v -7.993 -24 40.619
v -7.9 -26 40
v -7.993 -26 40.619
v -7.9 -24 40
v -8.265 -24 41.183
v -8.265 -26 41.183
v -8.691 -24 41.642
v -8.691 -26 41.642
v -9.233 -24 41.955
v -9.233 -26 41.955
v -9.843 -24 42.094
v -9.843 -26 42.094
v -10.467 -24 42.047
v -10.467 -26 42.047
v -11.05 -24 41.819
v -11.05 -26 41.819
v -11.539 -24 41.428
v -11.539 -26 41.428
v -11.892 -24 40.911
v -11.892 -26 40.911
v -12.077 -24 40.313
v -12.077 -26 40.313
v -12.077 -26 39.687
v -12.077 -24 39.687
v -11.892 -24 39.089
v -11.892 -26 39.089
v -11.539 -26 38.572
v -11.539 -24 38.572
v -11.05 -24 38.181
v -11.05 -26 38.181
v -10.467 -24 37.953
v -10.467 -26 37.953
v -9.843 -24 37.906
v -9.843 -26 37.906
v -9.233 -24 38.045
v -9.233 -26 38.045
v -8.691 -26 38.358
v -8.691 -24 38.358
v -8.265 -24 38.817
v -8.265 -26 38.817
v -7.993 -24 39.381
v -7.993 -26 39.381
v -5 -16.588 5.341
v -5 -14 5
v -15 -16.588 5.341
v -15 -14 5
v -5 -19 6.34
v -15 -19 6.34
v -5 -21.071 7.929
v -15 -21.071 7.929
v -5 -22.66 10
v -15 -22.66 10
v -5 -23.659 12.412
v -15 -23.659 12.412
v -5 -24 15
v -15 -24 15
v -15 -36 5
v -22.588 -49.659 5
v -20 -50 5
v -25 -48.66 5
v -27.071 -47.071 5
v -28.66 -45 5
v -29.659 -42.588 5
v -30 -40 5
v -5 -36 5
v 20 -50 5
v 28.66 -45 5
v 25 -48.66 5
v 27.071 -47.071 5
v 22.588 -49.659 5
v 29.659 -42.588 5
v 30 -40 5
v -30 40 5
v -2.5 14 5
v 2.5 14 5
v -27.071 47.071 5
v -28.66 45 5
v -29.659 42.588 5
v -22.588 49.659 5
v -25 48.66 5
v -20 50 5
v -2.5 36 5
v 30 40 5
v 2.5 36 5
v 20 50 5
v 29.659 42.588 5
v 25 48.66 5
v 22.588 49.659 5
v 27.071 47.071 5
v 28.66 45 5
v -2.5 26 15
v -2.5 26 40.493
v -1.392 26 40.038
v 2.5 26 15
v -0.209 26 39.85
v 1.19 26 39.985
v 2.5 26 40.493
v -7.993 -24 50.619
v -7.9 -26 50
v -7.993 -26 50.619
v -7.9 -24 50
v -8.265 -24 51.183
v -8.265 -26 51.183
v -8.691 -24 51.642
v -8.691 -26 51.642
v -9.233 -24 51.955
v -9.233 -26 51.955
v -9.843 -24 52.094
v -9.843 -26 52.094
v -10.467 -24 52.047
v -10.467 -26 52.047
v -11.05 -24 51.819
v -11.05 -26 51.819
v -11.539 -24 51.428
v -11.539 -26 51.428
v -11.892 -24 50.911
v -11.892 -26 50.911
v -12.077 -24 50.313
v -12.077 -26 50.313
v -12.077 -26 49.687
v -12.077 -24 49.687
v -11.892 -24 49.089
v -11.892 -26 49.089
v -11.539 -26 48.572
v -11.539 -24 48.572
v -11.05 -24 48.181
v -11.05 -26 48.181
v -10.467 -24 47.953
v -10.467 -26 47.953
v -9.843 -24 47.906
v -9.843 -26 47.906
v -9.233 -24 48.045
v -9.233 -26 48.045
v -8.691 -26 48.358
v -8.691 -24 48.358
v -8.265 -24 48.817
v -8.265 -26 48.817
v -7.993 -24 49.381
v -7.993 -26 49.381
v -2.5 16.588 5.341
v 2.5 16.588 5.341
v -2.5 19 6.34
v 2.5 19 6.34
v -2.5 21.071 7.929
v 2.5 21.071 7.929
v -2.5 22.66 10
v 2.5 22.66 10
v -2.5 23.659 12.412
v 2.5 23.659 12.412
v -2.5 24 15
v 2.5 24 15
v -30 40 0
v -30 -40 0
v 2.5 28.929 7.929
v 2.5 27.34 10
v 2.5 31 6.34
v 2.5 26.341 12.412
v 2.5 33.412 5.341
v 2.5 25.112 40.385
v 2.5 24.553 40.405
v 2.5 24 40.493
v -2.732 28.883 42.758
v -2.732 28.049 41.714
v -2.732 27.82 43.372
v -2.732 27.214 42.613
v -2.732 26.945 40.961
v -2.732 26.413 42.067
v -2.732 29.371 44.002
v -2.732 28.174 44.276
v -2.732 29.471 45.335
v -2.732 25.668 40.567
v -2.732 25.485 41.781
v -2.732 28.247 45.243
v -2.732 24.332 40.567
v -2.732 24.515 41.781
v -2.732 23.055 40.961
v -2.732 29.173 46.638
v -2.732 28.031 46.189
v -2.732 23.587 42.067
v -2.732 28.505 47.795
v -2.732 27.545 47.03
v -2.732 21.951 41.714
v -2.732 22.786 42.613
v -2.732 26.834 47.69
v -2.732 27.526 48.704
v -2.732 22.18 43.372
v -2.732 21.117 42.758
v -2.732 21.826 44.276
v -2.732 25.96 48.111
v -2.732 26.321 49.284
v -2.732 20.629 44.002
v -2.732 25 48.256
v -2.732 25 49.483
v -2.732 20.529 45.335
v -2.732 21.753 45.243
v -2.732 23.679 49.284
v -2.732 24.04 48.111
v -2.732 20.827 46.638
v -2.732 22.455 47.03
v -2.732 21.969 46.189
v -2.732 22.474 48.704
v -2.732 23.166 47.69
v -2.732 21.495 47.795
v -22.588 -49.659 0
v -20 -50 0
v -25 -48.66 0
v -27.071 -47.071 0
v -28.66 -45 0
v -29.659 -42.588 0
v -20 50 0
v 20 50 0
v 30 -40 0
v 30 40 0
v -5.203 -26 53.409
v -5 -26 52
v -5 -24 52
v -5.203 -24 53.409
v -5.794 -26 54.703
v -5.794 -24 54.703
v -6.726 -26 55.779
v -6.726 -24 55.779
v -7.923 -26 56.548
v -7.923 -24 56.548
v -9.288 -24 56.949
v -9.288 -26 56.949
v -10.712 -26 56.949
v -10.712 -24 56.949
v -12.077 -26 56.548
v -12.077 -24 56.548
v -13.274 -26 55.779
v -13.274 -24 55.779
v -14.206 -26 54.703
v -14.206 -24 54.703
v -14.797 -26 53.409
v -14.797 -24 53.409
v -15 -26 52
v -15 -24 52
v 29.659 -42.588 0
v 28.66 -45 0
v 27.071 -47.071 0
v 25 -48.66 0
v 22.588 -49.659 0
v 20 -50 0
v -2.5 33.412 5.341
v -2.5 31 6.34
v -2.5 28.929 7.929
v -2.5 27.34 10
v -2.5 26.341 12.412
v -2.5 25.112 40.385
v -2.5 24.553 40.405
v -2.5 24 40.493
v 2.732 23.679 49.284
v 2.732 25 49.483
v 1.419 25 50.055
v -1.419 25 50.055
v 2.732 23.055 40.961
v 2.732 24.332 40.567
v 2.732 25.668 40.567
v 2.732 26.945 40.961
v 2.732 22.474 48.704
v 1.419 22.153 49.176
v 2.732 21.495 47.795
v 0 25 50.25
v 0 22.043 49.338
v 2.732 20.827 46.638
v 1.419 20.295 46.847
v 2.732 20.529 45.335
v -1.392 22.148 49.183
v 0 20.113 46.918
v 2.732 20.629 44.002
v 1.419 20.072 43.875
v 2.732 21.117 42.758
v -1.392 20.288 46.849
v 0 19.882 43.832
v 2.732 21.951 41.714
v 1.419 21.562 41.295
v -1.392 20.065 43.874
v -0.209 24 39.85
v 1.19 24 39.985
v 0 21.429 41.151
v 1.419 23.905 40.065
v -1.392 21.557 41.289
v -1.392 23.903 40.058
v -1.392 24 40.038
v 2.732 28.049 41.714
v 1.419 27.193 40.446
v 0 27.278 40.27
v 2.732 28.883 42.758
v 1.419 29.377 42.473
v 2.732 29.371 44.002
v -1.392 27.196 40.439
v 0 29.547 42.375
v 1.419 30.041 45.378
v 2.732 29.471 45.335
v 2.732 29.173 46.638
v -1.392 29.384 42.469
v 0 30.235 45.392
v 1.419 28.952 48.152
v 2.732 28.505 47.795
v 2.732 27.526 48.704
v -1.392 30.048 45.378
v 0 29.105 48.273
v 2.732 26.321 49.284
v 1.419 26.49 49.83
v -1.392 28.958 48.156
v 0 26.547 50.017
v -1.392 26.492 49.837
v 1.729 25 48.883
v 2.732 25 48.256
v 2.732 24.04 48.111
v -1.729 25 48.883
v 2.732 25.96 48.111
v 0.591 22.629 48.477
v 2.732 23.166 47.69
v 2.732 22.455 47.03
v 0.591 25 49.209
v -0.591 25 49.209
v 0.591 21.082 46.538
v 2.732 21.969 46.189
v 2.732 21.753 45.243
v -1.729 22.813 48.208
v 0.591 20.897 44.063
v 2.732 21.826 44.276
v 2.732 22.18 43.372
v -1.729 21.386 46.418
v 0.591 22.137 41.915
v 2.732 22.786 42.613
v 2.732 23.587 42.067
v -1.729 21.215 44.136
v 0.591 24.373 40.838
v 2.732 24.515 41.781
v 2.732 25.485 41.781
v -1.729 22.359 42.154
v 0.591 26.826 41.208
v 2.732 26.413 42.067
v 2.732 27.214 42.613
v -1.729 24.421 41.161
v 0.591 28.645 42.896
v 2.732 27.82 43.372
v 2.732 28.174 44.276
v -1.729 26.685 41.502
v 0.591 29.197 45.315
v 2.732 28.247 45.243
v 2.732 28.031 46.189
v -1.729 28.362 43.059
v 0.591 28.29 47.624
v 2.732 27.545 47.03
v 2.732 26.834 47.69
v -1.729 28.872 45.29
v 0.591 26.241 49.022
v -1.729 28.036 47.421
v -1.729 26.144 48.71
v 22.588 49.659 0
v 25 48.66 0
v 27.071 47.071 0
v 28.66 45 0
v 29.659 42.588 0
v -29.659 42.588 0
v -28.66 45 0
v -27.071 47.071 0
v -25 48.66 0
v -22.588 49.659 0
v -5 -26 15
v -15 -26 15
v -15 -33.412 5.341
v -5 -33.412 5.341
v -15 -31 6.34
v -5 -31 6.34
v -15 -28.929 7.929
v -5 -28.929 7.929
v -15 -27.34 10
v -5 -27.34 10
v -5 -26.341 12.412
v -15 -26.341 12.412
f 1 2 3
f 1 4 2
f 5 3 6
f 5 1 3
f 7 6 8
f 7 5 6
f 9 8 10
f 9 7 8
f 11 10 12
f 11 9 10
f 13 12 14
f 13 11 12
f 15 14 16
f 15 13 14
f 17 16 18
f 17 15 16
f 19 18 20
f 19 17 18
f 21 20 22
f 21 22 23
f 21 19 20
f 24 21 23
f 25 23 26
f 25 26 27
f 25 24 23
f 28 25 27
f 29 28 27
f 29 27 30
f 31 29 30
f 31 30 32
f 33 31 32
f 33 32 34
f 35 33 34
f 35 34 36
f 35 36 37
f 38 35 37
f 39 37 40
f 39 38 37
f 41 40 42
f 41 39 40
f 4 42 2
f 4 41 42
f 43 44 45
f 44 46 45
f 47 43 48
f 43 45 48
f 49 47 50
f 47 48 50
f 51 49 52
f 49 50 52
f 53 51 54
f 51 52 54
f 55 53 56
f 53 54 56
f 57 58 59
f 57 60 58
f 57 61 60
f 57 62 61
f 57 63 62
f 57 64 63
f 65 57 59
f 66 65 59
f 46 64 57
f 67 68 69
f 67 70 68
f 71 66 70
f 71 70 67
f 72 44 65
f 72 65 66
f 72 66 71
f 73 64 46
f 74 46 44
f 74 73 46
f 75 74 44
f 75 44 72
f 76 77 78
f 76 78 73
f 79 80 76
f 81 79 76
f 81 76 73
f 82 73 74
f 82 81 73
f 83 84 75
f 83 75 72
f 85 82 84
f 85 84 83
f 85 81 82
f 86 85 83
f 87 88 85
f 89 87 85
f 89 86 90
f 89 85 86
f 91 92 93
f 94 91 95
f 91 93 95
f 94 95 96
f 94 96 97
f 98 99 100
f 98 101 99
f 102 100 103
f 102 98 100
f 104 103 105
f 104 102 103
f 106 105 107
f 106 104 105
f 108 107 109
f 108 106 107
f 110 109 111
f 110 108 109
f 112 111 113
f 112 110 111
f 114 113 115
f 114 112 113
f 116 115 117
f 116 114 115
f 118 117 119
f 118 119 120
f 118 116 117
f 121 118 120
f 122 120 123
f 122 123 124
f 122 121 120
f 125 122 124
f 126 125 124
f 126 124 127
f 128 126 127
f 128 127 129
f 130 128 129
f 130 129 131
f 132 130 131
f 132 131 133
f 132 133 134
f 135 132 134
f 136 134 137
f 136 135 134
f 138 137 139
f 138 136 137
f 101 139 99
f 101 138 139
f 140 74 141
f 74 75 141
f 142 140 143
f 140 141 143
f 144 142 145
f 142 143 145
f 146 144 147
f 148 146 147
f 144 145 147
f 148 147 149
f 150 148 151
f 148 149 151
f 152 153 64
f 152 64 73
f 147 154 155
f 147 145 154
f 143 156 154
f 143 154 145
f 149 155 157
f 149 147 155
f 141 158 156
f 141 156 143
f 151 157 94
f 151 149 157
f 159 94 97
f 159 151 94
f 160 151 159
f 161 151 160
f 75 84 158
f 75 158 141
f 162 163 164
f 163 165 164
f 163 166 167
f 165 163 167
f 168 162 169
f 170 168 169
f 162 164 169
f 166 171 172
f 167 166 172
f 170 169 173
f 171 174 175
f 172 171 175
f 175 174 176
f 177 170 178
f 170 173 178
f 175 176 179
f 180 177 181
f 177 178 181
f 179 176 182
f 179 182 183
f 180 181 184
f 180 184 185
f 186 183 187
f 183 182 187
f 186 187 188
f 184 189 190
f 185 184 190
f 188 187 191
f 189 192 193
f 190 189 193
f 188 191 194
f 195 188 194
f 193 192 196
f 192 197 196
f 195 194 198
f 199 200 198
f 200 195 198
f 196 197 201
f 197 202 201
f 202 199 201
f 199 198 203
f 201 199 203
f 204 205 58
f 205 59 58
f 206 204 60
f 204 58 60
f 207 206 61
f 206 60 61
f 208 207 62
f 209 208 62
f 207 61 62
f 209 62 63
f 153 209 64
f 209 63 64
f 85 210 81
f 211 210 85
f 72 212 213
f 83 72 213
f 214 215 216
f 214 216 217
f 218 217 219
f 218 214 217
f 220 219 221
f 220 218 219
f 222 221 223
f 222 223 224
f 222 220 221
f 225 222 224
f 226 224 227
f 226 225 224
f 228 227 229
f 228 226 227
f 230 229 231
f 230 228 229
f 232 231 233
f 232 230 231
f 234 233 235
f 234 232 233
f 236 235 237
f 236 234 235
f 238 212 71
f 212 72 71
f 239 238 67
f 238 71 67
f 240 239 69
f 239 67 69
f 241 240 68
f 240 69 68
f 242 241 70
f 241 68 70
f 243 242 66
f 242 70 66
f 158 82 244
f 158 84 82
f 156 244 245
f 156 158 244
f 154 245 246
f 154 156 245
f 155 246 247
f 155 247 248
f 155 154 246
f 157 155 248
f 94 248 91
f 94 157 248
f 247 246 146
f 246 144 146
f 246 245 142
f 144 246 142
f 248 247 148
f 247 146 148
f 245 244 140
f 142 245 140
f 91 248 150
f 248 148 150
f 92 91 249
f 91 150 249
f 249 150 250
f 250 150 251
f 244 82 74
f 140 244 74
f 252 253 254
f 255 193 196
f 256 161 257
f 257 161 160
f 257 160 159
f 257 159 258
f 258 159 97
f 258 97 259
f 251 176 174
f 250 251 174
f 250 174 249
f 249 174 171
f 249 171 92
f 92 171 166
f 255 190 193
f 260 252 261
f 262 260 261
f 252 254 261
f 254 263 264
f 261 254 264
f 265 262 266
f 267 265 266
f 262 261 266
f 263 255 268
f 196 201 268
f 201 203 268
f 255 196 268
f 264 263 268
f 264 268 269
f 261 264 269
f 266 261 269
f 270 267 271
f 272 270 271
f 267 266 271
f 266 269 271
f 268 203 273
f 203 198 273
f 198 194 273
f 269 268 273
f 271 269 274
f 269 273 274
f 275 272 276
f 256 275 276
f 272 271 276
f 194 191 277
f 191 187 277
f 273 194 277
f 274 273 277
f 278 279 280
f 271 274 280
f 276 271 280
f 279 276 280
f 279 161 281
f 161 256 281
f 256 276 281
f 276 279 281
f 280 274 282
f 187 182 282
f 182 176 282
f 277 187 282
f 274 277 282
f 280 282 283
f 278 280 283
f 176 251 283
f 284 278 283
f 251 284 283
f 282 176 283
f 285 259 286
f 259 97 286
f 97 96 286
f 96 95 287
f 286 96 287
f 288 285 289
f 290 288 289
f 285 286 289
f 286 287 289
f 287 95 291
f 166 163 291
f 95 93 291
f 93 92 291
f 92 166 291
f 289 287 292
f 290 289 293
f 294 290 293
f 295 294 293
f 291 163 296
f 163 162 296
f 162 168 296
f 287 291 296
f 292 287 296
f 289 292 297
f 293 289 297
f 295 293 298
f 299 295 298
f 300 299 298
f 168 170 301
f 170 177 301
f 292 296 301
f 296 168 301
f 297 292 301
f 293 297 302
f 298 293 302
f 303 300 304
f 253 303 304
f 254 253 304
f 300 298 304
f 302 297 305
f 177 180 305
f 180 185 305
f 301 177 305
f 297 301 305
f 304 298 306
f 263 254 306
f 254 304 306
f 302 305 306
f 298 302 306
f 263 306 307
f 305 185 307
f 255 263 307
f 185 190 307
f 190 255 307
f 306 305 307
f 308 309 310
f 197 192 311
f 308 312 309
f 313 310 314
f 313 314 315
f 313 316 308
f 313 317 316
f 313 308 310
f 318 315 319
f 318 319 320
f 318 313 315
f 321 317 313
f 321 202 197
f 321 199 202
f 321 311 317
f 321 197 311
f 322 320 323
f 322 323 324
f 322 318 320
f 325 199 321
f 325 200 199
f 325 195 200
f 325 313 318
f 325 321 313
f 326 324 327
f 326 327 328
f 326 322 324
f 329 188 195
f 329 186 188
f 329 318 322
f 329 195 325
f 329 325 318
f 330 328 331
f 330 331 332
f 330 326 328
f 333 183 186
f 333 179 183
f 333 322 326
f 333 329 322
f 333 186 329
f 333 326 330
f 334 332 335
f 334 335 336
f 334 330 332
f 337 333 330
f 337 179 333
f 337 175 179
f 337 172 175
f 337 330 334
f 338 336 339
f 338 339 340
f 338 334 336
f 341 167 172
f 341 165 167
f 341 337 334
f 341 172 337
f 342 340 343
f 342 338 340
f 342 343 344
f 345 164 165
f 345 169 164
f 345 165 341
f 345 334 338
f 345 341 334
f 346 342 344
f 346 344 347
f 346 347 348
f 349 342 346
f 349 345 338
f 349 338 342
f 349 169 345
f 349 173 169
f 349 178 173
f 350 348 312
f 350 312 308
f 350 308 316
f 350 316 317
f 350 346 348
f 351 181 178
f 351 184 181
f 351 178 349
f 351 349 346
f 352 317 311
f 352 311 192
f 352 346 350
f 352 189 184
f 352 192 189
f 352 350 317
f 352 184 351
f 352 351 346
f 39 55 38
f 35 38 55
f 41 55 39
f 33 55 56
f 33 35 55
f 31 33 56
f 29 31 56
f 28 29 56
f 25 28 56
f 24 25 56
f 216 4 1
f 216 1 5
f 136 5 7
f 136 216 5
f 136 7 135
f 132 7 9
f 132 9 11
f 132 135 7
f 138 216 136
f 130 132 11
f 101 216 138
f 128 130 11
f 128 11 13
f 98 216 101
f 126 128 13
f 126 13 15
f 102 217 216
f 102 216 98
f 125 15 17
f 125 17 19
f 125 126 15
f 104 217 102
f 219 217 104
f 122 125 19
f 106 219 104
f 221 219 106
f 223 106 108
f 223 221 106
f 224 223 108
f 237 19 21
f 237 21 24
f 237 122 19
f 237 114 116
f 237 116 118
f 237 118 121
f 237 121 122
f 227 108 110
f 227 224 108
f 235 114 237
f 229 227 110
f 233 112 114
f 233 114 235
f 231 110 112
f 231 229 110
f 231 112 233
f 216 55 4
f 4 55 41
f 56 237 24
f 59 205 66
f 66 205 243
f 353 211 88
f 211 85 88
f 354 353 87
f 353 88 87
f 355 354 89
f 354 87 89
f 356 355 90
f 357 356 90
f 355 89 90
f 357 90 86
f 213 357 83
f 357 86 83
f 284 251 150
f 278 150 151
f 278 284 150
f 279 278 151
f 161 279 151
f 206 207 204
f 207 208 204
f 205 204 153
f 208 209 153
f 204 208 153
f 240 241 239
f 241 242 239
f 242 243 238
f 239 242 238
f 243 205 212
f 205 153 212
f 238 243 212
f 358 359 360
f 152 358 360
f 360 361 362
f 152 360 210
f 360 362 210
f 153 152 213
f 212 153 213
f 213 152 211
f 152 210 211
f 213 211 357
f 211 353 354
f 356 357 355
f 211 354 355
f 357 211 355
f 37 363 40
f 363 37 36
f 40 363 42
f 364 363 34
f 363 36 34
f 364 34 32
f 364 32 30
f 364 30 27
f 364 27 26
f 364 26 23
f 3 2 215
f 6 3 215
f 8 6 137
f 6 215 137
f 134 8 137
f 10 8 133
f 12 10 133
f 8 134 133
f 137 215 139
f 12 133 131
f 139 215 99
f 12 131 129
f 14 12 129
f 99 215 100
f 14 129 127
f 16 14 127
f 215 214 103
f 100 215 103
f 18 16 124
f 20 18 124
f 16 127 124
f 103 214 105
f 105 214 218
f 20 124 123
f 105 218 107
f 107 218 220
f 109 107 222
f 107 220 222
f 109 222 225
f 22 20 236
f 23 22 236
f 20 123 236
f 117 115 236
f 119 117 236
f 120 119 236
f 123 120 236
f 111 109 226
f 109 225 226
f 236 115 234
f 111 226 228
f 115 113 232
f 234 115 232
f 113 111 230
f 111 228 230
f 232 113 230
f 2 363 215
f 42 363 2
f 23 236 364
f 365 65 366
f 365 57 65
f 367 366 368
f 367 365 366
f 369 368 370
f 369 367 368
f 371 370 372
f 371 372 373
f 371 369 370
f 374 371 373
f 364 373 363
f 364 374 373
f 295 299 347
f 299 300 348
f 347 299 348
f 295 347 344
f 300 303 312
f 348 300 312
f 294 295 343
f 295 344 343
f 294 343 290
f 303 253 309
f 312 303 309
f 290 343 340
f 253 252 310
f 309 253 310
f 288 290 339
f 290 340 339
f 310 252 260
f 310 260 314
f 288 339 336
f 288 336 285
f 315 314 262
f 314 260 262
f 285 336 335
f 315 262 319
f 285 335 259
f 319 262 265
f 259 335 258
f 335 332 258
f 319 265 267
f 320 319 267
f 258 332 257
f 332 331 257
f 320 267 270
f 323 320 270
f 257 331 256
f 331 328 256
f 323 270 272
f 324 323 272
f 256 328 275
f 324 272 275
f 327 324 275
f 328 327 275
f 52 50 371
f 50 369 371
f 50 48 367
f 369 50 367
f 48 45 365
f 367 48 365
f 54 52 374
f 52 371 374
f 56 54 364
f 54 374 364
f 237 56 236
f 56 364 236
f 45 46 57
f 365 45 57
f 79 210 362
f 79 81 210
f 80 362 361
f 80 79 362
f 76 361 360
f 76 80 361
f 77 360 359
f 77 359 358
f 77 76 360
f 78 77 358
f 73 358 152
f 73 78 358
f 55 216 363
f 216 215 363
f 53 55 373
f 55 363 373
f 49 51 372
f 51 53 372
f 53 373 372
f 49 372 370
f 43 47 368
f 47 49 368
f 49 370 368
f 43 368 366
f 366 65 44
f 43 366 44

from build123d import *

# Parameters (mm, degrees)
SKETCH_W     = 60
SKETCH_H     = 100
PAD_DEPTH    = 5
SKETCH001_R  = 2.1
PAD001_DEPTH = 1
SKETCH002_W  = 5
SKETCH002_H  = 35.7
PAD002_DEPTH = 1
FILLET_R     = 10
FILLET001_R  = 10
FILLET002_R  = 10


with BuildPart() as part:
    # Sketch → Pad (new body)
    with BuildSketch(Plane.XY):
        Rectangle(SKETCH_W, SKETCH_H)
    extrude(amount=PAD_DEPTH)

    # Sketch001 (on DatumPlane) → Pad001 (join, symmetric)
    with BuildSketch(Plane.XZ.offset(25)):
        with BuildLine():
            Line((-5, 52), (-5, 5))
            Line((-5, 5), (-15, 5))
            Line((-15, 5), (-15, 52))
            ThreePointArc((-5, 52), (-10, 57), (-15, 52))
        make_face()
        with Locations((-10, 50)):
            Circle(SKETCH001_R, mode=Mode.SUBTRACT)
        with Locations((-10, 40)):
            Circle(SKETCH001_R, mode=Mode.SUBTRACT)
    extrude(amount=PAD001_DEPTH, both=True)

    # Sketch002 (on DatumPlane) → Pad002 (join, symmetric)
    with BuildSketch(Plane.XZ.offset(-25)):
        with Locations((0, 22.85)):
            Rectangle(SKETCH002_W, SKETCH002_H)
    extrude(amount=PAD002_DEPTH, both=True)

    # Sketch003 (on DatumPlane) → Revolution (revolve)
    with BuildSketch(Plane.XZ.offset(-25)):
        with BuildLine():
            ThreePointArc((2.731847, 48.255689), (0, 49.25), (-2.731847, 48.255689))
            Line((-2.731847, 49.483248), (-2.731847, 48.255689))
            ThreePointArc((2.731847, 49.483248), (0, 50.25), (-2.731847, 49.483248))
            Line((2.731847, 48.255689), (2.731847, 49.483248))
        make_face()
    revolve(axis=Axis((0, 25, 45), (1, 0, 0)))

    # Fillet
    fillet_edges = [part.edges().sort_by_distance(p)[0] for p in [
        (-10, -26, 5),
        (-10, -24, 5),
    ]]
    fillet(fillet_edges, radius=FILLET_R)

    # Fillet001
    fillet001_edges = [part.edges().sort_by_distance(p)[0] for p in [
        (0, 24, 5),
        (0, 26, 5),
    ]]
    fillet(fillet001_edges, radius=FILLET001_R)

    # Fillet002
    fillet002_edges = [part.edges().sort_by_distance(p)[0] for p in [
        (-30, -50, 2.5),
        (-30, 50, 2.5),
        (30, 50, 2.5),
        (30, -50, 2.5),
    ]]
    fillet(fillet002_edges, radius=FILLET002_R)


solid = part.part
